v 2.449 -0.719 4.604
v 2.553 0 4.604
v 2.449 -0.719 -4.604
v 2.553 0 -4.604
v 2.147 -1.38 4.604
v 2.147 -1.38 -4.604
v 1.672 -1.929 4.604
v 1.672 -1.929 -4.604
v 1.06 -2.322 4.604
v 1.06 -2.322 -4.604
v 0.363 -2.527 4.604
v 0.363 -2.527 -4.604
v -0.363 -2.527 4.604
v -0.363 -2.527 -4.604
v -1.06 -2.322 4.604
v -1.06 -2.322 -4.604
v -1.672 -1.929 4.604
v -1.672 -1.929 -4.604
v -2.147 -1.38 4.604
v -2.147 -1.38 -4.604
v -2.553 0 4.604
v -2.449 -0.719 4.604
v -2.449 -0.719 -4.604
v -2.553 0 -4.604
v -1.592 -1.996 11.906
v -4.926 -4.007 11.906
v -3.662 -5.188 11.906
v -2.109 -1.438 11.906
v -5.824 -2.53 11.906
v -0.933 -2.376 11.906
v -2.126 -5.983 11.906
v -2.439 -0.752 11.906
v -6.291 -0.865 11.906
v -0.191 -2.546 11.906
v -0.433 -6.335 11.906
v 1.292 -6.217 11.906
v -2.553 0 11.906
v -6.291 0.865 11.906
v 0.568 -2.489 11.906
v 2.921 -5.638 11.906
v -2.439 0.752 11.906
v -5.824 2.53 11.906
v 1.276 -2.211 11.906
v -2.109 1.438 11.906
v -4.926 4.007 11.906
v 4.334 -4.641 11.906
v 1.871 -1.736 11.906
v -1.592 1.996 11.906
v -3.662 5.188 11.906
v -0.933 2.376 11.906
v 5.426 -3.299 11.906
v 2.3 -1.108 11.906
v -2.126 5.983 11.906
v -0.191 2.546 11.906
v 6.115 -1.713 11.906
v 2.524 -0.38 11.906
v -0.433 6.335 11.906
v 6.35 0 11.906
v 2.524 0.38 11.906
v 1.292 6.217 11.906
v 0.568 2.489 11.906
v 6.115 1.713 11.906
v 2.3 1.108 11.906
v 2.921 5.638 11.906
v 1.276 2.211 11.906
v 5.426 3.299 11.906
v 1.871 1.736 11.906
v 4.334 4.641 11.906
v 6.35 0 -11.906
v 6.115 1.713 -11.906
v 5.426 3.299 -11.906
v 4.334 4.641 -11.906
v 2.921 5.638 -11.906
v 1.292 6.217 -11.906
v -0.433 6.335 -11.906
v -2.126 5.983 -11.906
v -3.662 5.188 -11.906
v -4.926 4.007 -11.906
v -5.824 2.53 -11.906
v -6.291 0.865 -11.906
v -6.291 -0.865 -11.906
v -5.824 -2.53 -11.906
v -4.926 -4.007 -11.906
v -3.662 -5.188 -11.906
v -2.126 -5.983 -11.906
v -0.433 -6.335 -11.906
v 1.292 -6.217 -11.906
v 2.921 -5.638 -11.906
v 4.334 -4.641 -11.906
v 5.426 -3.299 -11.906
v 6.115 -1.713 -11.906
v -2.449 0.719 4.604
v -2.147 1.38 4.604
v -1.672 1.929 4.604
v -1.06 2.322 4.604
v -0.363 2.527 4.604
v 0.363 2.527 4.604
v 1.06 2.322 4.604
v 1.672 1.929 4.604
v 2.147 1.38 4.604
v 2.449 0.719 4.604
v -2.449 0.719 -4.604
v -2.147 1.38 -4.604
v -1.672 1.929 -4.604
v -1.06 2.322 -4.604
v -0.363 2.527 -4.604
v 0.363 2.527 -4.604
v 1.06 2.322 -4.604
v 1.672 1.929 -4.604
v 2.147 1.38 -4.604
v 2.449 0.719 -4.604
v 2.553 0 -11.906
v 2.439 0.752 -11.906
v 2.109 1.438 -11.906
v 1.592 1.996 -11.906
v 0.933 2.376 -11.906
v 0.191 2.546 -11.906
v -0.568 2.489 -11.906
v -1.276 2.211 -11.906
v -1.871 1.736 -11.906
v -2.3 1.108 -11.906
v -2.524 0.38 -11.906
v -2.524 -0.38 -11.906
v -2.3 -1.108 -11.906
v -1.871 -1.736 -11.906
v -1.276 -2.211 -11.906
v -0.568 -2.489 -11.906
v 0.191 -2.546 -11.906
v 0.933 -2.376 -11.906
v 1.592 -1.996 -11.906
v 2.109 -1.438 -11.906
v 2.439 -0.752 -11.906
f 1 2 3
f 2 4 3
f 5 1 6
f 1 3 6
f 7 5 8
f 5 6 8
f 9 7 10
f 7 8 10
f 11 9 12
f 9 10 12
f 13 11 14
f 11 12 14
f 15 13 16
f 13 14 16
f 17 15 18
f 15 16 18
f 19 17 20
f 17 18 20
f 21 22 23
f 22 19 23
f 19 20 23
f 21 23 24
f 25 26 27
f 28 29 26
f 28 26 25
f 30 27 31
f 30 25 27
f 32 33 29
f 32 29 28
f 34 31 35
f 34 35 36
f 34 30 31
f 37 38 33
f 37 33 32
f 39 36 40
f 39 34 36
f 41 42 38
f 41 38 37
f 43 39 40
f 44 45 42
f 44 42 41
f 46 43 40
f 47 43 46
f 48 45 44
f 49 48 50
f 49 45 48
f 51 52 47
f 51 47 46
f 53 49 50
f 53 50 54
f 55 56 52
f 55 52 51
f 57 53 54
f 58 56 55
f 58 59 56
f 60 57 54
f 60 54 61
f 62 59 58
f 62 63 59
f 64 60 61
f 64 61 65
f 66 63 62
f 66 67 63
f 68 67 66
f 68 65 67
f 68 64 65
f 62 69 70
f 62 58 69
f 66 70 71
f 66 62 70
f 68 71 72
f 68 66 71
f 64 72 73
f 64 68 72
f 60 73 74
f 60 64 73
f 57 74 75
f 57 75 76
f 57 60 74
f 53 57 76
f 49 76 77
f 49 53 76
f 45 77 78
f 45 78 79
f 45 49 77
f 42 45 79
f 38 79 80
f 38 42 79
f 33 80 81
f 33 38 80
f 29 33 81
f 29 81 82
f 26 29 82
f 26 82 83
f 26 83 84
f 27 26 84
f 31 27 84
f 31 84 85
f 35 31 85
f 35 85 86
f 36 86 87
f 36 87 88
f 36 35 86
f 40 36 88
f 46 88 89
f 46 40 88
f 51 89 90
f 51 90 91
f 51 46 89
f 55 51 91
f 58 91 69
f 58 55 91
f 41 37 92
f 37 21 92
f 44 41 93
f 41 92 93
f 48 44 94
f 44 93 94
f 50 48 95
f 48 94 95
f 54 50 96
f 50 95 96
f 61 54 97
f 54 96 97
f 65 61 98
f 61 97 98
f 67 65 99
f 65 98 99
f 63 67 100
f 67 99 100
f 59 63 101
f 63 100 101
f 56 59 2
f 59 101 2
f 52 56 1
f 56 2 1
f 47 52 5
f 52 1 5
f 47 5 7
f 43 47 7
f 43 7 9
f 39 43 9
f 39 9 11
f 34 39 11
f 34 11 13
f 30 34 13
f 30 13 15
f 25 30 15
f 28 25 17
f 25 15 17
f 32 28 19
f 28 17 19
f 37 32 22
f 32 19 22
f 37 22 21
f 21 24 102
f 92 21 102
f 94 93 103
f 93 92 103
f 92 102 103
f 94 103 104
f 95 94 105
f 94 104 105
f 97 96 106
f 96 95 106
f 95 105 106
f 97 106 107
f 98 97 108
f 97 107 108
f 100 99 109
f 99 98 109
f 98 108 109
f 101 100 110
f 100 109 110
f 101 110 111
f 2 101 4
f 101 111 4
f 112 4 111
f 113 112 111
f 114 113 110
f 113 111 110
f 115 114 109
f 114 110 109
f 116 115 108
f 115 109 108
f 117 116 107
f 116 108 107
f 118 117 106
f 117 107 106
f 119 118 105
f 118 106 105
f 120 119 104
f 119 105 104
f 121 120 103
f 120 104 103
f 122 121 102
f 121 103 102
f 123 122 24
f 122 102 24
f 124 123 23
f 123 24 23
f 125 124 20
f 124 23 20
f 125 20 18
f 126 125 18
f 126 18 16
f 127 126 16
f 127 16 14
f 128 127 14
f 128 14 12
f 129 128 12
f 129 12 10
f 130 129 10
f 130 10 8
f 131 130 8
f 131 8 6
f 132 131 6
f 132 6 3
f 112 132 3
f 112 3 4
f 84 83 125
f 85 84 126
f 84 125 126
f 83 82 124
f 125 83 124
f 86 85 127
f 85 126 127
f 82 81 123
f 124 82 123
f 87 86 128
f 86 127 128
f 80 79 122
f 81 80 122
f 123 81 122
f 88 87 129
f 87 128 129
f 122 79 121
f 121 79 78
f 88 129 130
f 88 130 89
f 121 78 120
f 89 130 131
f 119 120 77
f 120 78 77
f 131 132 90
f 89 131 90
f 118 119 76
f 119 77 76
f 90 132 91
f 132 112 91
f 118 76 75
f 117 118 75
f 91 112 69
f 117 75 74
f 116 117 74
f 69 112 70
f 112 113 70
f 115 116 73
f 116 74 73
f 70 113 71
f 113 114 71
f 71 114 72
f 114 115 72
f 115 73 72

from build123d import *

# Parameters (mm, degrees)
SKETCH1_R                             = 6.35
BOSS_EXTRUDE1_DEPTH                   = 11.90625
F_1_4_20_TAPPED_HOLE1_D               = 5.1054
F_1_4_20_TAPPED_HOLE1_DEPTH           = 16.51
F_1_4_20_TAPPED_HOLE1_TIP             = 1.533816902
F_1_4_20_TAPPED_HOLE1_ON_FACE_2_D     = 5.1054
F_1_4_20_TAPPED_HOLE1_ON_FACE_2_DEPTH = 16.51
F_1_4_20_TAPPED_HOLE1_ON_FACE_2_TIP   = 1.533816902


with BuildPart() as part:
    # Sketch1 → Boss-Extrude1 (new, symmetric)
    with BuildSketch(Plane.XY):
        Circle(SKETCH1_R)
    extrude(amount=BOSS_EXTRUDE1_DEPTH, both=True)

    # 1/4-20 Tapped Hole1
    with Locations(Plane.XY.offset(11.90625)):
        with Locations((0, 0)):
            Hole(F_1_4_20_TAPPED_HOLE1_D / 2, depth=F_1_4_20_TAPPED_HOLE1_DEPTH)
            with Locations((0, 0, -(F_1_4_20_TAPPED_HOLE1_DEPTH + F_1_4_20_TAPPED_HOLE1_TIP / 2))):  # 118° drill point
                Cone(0, F_1_4_20_TAPPED_HOLE1_D / 2, F_1_4_20_TAPPED_HOLE1_TIP, mode=Mode.SUBTRACT)

    # 1/4-20 Tapped Hole1 on face 2
    with Locations(Plane(origin=(0, 0, -11.90625), x_dir=(-1, 0, 0), z_dir=(0, 0, -1))):
        with Locations((0, 0)):
            Hole(F_1_4_20_TAPPED_HOLE1_ON_FACE_2_D / 2, depth=F_1_4_20_TAPPED_HOLE1_ON_FACE_2_DEPTH)
            with Locations((0, 0, -(F_1_4_20_TAPPED_HOLE1_ON_FACE_2_DEPTH + F_1_4_20_TAPPED_HOLE1_ON_FACE_2_TIP / 2))):  # 118° drill point
                Cone(0, F_1_4_20_TAPPED_HOLE1_ON_FACE_2_D / 2, F_1_4_20_TAPPED_HOLE1_ON_FACE_2_TIP, mode=Mode.SUBTRACT)


solid = part.part
